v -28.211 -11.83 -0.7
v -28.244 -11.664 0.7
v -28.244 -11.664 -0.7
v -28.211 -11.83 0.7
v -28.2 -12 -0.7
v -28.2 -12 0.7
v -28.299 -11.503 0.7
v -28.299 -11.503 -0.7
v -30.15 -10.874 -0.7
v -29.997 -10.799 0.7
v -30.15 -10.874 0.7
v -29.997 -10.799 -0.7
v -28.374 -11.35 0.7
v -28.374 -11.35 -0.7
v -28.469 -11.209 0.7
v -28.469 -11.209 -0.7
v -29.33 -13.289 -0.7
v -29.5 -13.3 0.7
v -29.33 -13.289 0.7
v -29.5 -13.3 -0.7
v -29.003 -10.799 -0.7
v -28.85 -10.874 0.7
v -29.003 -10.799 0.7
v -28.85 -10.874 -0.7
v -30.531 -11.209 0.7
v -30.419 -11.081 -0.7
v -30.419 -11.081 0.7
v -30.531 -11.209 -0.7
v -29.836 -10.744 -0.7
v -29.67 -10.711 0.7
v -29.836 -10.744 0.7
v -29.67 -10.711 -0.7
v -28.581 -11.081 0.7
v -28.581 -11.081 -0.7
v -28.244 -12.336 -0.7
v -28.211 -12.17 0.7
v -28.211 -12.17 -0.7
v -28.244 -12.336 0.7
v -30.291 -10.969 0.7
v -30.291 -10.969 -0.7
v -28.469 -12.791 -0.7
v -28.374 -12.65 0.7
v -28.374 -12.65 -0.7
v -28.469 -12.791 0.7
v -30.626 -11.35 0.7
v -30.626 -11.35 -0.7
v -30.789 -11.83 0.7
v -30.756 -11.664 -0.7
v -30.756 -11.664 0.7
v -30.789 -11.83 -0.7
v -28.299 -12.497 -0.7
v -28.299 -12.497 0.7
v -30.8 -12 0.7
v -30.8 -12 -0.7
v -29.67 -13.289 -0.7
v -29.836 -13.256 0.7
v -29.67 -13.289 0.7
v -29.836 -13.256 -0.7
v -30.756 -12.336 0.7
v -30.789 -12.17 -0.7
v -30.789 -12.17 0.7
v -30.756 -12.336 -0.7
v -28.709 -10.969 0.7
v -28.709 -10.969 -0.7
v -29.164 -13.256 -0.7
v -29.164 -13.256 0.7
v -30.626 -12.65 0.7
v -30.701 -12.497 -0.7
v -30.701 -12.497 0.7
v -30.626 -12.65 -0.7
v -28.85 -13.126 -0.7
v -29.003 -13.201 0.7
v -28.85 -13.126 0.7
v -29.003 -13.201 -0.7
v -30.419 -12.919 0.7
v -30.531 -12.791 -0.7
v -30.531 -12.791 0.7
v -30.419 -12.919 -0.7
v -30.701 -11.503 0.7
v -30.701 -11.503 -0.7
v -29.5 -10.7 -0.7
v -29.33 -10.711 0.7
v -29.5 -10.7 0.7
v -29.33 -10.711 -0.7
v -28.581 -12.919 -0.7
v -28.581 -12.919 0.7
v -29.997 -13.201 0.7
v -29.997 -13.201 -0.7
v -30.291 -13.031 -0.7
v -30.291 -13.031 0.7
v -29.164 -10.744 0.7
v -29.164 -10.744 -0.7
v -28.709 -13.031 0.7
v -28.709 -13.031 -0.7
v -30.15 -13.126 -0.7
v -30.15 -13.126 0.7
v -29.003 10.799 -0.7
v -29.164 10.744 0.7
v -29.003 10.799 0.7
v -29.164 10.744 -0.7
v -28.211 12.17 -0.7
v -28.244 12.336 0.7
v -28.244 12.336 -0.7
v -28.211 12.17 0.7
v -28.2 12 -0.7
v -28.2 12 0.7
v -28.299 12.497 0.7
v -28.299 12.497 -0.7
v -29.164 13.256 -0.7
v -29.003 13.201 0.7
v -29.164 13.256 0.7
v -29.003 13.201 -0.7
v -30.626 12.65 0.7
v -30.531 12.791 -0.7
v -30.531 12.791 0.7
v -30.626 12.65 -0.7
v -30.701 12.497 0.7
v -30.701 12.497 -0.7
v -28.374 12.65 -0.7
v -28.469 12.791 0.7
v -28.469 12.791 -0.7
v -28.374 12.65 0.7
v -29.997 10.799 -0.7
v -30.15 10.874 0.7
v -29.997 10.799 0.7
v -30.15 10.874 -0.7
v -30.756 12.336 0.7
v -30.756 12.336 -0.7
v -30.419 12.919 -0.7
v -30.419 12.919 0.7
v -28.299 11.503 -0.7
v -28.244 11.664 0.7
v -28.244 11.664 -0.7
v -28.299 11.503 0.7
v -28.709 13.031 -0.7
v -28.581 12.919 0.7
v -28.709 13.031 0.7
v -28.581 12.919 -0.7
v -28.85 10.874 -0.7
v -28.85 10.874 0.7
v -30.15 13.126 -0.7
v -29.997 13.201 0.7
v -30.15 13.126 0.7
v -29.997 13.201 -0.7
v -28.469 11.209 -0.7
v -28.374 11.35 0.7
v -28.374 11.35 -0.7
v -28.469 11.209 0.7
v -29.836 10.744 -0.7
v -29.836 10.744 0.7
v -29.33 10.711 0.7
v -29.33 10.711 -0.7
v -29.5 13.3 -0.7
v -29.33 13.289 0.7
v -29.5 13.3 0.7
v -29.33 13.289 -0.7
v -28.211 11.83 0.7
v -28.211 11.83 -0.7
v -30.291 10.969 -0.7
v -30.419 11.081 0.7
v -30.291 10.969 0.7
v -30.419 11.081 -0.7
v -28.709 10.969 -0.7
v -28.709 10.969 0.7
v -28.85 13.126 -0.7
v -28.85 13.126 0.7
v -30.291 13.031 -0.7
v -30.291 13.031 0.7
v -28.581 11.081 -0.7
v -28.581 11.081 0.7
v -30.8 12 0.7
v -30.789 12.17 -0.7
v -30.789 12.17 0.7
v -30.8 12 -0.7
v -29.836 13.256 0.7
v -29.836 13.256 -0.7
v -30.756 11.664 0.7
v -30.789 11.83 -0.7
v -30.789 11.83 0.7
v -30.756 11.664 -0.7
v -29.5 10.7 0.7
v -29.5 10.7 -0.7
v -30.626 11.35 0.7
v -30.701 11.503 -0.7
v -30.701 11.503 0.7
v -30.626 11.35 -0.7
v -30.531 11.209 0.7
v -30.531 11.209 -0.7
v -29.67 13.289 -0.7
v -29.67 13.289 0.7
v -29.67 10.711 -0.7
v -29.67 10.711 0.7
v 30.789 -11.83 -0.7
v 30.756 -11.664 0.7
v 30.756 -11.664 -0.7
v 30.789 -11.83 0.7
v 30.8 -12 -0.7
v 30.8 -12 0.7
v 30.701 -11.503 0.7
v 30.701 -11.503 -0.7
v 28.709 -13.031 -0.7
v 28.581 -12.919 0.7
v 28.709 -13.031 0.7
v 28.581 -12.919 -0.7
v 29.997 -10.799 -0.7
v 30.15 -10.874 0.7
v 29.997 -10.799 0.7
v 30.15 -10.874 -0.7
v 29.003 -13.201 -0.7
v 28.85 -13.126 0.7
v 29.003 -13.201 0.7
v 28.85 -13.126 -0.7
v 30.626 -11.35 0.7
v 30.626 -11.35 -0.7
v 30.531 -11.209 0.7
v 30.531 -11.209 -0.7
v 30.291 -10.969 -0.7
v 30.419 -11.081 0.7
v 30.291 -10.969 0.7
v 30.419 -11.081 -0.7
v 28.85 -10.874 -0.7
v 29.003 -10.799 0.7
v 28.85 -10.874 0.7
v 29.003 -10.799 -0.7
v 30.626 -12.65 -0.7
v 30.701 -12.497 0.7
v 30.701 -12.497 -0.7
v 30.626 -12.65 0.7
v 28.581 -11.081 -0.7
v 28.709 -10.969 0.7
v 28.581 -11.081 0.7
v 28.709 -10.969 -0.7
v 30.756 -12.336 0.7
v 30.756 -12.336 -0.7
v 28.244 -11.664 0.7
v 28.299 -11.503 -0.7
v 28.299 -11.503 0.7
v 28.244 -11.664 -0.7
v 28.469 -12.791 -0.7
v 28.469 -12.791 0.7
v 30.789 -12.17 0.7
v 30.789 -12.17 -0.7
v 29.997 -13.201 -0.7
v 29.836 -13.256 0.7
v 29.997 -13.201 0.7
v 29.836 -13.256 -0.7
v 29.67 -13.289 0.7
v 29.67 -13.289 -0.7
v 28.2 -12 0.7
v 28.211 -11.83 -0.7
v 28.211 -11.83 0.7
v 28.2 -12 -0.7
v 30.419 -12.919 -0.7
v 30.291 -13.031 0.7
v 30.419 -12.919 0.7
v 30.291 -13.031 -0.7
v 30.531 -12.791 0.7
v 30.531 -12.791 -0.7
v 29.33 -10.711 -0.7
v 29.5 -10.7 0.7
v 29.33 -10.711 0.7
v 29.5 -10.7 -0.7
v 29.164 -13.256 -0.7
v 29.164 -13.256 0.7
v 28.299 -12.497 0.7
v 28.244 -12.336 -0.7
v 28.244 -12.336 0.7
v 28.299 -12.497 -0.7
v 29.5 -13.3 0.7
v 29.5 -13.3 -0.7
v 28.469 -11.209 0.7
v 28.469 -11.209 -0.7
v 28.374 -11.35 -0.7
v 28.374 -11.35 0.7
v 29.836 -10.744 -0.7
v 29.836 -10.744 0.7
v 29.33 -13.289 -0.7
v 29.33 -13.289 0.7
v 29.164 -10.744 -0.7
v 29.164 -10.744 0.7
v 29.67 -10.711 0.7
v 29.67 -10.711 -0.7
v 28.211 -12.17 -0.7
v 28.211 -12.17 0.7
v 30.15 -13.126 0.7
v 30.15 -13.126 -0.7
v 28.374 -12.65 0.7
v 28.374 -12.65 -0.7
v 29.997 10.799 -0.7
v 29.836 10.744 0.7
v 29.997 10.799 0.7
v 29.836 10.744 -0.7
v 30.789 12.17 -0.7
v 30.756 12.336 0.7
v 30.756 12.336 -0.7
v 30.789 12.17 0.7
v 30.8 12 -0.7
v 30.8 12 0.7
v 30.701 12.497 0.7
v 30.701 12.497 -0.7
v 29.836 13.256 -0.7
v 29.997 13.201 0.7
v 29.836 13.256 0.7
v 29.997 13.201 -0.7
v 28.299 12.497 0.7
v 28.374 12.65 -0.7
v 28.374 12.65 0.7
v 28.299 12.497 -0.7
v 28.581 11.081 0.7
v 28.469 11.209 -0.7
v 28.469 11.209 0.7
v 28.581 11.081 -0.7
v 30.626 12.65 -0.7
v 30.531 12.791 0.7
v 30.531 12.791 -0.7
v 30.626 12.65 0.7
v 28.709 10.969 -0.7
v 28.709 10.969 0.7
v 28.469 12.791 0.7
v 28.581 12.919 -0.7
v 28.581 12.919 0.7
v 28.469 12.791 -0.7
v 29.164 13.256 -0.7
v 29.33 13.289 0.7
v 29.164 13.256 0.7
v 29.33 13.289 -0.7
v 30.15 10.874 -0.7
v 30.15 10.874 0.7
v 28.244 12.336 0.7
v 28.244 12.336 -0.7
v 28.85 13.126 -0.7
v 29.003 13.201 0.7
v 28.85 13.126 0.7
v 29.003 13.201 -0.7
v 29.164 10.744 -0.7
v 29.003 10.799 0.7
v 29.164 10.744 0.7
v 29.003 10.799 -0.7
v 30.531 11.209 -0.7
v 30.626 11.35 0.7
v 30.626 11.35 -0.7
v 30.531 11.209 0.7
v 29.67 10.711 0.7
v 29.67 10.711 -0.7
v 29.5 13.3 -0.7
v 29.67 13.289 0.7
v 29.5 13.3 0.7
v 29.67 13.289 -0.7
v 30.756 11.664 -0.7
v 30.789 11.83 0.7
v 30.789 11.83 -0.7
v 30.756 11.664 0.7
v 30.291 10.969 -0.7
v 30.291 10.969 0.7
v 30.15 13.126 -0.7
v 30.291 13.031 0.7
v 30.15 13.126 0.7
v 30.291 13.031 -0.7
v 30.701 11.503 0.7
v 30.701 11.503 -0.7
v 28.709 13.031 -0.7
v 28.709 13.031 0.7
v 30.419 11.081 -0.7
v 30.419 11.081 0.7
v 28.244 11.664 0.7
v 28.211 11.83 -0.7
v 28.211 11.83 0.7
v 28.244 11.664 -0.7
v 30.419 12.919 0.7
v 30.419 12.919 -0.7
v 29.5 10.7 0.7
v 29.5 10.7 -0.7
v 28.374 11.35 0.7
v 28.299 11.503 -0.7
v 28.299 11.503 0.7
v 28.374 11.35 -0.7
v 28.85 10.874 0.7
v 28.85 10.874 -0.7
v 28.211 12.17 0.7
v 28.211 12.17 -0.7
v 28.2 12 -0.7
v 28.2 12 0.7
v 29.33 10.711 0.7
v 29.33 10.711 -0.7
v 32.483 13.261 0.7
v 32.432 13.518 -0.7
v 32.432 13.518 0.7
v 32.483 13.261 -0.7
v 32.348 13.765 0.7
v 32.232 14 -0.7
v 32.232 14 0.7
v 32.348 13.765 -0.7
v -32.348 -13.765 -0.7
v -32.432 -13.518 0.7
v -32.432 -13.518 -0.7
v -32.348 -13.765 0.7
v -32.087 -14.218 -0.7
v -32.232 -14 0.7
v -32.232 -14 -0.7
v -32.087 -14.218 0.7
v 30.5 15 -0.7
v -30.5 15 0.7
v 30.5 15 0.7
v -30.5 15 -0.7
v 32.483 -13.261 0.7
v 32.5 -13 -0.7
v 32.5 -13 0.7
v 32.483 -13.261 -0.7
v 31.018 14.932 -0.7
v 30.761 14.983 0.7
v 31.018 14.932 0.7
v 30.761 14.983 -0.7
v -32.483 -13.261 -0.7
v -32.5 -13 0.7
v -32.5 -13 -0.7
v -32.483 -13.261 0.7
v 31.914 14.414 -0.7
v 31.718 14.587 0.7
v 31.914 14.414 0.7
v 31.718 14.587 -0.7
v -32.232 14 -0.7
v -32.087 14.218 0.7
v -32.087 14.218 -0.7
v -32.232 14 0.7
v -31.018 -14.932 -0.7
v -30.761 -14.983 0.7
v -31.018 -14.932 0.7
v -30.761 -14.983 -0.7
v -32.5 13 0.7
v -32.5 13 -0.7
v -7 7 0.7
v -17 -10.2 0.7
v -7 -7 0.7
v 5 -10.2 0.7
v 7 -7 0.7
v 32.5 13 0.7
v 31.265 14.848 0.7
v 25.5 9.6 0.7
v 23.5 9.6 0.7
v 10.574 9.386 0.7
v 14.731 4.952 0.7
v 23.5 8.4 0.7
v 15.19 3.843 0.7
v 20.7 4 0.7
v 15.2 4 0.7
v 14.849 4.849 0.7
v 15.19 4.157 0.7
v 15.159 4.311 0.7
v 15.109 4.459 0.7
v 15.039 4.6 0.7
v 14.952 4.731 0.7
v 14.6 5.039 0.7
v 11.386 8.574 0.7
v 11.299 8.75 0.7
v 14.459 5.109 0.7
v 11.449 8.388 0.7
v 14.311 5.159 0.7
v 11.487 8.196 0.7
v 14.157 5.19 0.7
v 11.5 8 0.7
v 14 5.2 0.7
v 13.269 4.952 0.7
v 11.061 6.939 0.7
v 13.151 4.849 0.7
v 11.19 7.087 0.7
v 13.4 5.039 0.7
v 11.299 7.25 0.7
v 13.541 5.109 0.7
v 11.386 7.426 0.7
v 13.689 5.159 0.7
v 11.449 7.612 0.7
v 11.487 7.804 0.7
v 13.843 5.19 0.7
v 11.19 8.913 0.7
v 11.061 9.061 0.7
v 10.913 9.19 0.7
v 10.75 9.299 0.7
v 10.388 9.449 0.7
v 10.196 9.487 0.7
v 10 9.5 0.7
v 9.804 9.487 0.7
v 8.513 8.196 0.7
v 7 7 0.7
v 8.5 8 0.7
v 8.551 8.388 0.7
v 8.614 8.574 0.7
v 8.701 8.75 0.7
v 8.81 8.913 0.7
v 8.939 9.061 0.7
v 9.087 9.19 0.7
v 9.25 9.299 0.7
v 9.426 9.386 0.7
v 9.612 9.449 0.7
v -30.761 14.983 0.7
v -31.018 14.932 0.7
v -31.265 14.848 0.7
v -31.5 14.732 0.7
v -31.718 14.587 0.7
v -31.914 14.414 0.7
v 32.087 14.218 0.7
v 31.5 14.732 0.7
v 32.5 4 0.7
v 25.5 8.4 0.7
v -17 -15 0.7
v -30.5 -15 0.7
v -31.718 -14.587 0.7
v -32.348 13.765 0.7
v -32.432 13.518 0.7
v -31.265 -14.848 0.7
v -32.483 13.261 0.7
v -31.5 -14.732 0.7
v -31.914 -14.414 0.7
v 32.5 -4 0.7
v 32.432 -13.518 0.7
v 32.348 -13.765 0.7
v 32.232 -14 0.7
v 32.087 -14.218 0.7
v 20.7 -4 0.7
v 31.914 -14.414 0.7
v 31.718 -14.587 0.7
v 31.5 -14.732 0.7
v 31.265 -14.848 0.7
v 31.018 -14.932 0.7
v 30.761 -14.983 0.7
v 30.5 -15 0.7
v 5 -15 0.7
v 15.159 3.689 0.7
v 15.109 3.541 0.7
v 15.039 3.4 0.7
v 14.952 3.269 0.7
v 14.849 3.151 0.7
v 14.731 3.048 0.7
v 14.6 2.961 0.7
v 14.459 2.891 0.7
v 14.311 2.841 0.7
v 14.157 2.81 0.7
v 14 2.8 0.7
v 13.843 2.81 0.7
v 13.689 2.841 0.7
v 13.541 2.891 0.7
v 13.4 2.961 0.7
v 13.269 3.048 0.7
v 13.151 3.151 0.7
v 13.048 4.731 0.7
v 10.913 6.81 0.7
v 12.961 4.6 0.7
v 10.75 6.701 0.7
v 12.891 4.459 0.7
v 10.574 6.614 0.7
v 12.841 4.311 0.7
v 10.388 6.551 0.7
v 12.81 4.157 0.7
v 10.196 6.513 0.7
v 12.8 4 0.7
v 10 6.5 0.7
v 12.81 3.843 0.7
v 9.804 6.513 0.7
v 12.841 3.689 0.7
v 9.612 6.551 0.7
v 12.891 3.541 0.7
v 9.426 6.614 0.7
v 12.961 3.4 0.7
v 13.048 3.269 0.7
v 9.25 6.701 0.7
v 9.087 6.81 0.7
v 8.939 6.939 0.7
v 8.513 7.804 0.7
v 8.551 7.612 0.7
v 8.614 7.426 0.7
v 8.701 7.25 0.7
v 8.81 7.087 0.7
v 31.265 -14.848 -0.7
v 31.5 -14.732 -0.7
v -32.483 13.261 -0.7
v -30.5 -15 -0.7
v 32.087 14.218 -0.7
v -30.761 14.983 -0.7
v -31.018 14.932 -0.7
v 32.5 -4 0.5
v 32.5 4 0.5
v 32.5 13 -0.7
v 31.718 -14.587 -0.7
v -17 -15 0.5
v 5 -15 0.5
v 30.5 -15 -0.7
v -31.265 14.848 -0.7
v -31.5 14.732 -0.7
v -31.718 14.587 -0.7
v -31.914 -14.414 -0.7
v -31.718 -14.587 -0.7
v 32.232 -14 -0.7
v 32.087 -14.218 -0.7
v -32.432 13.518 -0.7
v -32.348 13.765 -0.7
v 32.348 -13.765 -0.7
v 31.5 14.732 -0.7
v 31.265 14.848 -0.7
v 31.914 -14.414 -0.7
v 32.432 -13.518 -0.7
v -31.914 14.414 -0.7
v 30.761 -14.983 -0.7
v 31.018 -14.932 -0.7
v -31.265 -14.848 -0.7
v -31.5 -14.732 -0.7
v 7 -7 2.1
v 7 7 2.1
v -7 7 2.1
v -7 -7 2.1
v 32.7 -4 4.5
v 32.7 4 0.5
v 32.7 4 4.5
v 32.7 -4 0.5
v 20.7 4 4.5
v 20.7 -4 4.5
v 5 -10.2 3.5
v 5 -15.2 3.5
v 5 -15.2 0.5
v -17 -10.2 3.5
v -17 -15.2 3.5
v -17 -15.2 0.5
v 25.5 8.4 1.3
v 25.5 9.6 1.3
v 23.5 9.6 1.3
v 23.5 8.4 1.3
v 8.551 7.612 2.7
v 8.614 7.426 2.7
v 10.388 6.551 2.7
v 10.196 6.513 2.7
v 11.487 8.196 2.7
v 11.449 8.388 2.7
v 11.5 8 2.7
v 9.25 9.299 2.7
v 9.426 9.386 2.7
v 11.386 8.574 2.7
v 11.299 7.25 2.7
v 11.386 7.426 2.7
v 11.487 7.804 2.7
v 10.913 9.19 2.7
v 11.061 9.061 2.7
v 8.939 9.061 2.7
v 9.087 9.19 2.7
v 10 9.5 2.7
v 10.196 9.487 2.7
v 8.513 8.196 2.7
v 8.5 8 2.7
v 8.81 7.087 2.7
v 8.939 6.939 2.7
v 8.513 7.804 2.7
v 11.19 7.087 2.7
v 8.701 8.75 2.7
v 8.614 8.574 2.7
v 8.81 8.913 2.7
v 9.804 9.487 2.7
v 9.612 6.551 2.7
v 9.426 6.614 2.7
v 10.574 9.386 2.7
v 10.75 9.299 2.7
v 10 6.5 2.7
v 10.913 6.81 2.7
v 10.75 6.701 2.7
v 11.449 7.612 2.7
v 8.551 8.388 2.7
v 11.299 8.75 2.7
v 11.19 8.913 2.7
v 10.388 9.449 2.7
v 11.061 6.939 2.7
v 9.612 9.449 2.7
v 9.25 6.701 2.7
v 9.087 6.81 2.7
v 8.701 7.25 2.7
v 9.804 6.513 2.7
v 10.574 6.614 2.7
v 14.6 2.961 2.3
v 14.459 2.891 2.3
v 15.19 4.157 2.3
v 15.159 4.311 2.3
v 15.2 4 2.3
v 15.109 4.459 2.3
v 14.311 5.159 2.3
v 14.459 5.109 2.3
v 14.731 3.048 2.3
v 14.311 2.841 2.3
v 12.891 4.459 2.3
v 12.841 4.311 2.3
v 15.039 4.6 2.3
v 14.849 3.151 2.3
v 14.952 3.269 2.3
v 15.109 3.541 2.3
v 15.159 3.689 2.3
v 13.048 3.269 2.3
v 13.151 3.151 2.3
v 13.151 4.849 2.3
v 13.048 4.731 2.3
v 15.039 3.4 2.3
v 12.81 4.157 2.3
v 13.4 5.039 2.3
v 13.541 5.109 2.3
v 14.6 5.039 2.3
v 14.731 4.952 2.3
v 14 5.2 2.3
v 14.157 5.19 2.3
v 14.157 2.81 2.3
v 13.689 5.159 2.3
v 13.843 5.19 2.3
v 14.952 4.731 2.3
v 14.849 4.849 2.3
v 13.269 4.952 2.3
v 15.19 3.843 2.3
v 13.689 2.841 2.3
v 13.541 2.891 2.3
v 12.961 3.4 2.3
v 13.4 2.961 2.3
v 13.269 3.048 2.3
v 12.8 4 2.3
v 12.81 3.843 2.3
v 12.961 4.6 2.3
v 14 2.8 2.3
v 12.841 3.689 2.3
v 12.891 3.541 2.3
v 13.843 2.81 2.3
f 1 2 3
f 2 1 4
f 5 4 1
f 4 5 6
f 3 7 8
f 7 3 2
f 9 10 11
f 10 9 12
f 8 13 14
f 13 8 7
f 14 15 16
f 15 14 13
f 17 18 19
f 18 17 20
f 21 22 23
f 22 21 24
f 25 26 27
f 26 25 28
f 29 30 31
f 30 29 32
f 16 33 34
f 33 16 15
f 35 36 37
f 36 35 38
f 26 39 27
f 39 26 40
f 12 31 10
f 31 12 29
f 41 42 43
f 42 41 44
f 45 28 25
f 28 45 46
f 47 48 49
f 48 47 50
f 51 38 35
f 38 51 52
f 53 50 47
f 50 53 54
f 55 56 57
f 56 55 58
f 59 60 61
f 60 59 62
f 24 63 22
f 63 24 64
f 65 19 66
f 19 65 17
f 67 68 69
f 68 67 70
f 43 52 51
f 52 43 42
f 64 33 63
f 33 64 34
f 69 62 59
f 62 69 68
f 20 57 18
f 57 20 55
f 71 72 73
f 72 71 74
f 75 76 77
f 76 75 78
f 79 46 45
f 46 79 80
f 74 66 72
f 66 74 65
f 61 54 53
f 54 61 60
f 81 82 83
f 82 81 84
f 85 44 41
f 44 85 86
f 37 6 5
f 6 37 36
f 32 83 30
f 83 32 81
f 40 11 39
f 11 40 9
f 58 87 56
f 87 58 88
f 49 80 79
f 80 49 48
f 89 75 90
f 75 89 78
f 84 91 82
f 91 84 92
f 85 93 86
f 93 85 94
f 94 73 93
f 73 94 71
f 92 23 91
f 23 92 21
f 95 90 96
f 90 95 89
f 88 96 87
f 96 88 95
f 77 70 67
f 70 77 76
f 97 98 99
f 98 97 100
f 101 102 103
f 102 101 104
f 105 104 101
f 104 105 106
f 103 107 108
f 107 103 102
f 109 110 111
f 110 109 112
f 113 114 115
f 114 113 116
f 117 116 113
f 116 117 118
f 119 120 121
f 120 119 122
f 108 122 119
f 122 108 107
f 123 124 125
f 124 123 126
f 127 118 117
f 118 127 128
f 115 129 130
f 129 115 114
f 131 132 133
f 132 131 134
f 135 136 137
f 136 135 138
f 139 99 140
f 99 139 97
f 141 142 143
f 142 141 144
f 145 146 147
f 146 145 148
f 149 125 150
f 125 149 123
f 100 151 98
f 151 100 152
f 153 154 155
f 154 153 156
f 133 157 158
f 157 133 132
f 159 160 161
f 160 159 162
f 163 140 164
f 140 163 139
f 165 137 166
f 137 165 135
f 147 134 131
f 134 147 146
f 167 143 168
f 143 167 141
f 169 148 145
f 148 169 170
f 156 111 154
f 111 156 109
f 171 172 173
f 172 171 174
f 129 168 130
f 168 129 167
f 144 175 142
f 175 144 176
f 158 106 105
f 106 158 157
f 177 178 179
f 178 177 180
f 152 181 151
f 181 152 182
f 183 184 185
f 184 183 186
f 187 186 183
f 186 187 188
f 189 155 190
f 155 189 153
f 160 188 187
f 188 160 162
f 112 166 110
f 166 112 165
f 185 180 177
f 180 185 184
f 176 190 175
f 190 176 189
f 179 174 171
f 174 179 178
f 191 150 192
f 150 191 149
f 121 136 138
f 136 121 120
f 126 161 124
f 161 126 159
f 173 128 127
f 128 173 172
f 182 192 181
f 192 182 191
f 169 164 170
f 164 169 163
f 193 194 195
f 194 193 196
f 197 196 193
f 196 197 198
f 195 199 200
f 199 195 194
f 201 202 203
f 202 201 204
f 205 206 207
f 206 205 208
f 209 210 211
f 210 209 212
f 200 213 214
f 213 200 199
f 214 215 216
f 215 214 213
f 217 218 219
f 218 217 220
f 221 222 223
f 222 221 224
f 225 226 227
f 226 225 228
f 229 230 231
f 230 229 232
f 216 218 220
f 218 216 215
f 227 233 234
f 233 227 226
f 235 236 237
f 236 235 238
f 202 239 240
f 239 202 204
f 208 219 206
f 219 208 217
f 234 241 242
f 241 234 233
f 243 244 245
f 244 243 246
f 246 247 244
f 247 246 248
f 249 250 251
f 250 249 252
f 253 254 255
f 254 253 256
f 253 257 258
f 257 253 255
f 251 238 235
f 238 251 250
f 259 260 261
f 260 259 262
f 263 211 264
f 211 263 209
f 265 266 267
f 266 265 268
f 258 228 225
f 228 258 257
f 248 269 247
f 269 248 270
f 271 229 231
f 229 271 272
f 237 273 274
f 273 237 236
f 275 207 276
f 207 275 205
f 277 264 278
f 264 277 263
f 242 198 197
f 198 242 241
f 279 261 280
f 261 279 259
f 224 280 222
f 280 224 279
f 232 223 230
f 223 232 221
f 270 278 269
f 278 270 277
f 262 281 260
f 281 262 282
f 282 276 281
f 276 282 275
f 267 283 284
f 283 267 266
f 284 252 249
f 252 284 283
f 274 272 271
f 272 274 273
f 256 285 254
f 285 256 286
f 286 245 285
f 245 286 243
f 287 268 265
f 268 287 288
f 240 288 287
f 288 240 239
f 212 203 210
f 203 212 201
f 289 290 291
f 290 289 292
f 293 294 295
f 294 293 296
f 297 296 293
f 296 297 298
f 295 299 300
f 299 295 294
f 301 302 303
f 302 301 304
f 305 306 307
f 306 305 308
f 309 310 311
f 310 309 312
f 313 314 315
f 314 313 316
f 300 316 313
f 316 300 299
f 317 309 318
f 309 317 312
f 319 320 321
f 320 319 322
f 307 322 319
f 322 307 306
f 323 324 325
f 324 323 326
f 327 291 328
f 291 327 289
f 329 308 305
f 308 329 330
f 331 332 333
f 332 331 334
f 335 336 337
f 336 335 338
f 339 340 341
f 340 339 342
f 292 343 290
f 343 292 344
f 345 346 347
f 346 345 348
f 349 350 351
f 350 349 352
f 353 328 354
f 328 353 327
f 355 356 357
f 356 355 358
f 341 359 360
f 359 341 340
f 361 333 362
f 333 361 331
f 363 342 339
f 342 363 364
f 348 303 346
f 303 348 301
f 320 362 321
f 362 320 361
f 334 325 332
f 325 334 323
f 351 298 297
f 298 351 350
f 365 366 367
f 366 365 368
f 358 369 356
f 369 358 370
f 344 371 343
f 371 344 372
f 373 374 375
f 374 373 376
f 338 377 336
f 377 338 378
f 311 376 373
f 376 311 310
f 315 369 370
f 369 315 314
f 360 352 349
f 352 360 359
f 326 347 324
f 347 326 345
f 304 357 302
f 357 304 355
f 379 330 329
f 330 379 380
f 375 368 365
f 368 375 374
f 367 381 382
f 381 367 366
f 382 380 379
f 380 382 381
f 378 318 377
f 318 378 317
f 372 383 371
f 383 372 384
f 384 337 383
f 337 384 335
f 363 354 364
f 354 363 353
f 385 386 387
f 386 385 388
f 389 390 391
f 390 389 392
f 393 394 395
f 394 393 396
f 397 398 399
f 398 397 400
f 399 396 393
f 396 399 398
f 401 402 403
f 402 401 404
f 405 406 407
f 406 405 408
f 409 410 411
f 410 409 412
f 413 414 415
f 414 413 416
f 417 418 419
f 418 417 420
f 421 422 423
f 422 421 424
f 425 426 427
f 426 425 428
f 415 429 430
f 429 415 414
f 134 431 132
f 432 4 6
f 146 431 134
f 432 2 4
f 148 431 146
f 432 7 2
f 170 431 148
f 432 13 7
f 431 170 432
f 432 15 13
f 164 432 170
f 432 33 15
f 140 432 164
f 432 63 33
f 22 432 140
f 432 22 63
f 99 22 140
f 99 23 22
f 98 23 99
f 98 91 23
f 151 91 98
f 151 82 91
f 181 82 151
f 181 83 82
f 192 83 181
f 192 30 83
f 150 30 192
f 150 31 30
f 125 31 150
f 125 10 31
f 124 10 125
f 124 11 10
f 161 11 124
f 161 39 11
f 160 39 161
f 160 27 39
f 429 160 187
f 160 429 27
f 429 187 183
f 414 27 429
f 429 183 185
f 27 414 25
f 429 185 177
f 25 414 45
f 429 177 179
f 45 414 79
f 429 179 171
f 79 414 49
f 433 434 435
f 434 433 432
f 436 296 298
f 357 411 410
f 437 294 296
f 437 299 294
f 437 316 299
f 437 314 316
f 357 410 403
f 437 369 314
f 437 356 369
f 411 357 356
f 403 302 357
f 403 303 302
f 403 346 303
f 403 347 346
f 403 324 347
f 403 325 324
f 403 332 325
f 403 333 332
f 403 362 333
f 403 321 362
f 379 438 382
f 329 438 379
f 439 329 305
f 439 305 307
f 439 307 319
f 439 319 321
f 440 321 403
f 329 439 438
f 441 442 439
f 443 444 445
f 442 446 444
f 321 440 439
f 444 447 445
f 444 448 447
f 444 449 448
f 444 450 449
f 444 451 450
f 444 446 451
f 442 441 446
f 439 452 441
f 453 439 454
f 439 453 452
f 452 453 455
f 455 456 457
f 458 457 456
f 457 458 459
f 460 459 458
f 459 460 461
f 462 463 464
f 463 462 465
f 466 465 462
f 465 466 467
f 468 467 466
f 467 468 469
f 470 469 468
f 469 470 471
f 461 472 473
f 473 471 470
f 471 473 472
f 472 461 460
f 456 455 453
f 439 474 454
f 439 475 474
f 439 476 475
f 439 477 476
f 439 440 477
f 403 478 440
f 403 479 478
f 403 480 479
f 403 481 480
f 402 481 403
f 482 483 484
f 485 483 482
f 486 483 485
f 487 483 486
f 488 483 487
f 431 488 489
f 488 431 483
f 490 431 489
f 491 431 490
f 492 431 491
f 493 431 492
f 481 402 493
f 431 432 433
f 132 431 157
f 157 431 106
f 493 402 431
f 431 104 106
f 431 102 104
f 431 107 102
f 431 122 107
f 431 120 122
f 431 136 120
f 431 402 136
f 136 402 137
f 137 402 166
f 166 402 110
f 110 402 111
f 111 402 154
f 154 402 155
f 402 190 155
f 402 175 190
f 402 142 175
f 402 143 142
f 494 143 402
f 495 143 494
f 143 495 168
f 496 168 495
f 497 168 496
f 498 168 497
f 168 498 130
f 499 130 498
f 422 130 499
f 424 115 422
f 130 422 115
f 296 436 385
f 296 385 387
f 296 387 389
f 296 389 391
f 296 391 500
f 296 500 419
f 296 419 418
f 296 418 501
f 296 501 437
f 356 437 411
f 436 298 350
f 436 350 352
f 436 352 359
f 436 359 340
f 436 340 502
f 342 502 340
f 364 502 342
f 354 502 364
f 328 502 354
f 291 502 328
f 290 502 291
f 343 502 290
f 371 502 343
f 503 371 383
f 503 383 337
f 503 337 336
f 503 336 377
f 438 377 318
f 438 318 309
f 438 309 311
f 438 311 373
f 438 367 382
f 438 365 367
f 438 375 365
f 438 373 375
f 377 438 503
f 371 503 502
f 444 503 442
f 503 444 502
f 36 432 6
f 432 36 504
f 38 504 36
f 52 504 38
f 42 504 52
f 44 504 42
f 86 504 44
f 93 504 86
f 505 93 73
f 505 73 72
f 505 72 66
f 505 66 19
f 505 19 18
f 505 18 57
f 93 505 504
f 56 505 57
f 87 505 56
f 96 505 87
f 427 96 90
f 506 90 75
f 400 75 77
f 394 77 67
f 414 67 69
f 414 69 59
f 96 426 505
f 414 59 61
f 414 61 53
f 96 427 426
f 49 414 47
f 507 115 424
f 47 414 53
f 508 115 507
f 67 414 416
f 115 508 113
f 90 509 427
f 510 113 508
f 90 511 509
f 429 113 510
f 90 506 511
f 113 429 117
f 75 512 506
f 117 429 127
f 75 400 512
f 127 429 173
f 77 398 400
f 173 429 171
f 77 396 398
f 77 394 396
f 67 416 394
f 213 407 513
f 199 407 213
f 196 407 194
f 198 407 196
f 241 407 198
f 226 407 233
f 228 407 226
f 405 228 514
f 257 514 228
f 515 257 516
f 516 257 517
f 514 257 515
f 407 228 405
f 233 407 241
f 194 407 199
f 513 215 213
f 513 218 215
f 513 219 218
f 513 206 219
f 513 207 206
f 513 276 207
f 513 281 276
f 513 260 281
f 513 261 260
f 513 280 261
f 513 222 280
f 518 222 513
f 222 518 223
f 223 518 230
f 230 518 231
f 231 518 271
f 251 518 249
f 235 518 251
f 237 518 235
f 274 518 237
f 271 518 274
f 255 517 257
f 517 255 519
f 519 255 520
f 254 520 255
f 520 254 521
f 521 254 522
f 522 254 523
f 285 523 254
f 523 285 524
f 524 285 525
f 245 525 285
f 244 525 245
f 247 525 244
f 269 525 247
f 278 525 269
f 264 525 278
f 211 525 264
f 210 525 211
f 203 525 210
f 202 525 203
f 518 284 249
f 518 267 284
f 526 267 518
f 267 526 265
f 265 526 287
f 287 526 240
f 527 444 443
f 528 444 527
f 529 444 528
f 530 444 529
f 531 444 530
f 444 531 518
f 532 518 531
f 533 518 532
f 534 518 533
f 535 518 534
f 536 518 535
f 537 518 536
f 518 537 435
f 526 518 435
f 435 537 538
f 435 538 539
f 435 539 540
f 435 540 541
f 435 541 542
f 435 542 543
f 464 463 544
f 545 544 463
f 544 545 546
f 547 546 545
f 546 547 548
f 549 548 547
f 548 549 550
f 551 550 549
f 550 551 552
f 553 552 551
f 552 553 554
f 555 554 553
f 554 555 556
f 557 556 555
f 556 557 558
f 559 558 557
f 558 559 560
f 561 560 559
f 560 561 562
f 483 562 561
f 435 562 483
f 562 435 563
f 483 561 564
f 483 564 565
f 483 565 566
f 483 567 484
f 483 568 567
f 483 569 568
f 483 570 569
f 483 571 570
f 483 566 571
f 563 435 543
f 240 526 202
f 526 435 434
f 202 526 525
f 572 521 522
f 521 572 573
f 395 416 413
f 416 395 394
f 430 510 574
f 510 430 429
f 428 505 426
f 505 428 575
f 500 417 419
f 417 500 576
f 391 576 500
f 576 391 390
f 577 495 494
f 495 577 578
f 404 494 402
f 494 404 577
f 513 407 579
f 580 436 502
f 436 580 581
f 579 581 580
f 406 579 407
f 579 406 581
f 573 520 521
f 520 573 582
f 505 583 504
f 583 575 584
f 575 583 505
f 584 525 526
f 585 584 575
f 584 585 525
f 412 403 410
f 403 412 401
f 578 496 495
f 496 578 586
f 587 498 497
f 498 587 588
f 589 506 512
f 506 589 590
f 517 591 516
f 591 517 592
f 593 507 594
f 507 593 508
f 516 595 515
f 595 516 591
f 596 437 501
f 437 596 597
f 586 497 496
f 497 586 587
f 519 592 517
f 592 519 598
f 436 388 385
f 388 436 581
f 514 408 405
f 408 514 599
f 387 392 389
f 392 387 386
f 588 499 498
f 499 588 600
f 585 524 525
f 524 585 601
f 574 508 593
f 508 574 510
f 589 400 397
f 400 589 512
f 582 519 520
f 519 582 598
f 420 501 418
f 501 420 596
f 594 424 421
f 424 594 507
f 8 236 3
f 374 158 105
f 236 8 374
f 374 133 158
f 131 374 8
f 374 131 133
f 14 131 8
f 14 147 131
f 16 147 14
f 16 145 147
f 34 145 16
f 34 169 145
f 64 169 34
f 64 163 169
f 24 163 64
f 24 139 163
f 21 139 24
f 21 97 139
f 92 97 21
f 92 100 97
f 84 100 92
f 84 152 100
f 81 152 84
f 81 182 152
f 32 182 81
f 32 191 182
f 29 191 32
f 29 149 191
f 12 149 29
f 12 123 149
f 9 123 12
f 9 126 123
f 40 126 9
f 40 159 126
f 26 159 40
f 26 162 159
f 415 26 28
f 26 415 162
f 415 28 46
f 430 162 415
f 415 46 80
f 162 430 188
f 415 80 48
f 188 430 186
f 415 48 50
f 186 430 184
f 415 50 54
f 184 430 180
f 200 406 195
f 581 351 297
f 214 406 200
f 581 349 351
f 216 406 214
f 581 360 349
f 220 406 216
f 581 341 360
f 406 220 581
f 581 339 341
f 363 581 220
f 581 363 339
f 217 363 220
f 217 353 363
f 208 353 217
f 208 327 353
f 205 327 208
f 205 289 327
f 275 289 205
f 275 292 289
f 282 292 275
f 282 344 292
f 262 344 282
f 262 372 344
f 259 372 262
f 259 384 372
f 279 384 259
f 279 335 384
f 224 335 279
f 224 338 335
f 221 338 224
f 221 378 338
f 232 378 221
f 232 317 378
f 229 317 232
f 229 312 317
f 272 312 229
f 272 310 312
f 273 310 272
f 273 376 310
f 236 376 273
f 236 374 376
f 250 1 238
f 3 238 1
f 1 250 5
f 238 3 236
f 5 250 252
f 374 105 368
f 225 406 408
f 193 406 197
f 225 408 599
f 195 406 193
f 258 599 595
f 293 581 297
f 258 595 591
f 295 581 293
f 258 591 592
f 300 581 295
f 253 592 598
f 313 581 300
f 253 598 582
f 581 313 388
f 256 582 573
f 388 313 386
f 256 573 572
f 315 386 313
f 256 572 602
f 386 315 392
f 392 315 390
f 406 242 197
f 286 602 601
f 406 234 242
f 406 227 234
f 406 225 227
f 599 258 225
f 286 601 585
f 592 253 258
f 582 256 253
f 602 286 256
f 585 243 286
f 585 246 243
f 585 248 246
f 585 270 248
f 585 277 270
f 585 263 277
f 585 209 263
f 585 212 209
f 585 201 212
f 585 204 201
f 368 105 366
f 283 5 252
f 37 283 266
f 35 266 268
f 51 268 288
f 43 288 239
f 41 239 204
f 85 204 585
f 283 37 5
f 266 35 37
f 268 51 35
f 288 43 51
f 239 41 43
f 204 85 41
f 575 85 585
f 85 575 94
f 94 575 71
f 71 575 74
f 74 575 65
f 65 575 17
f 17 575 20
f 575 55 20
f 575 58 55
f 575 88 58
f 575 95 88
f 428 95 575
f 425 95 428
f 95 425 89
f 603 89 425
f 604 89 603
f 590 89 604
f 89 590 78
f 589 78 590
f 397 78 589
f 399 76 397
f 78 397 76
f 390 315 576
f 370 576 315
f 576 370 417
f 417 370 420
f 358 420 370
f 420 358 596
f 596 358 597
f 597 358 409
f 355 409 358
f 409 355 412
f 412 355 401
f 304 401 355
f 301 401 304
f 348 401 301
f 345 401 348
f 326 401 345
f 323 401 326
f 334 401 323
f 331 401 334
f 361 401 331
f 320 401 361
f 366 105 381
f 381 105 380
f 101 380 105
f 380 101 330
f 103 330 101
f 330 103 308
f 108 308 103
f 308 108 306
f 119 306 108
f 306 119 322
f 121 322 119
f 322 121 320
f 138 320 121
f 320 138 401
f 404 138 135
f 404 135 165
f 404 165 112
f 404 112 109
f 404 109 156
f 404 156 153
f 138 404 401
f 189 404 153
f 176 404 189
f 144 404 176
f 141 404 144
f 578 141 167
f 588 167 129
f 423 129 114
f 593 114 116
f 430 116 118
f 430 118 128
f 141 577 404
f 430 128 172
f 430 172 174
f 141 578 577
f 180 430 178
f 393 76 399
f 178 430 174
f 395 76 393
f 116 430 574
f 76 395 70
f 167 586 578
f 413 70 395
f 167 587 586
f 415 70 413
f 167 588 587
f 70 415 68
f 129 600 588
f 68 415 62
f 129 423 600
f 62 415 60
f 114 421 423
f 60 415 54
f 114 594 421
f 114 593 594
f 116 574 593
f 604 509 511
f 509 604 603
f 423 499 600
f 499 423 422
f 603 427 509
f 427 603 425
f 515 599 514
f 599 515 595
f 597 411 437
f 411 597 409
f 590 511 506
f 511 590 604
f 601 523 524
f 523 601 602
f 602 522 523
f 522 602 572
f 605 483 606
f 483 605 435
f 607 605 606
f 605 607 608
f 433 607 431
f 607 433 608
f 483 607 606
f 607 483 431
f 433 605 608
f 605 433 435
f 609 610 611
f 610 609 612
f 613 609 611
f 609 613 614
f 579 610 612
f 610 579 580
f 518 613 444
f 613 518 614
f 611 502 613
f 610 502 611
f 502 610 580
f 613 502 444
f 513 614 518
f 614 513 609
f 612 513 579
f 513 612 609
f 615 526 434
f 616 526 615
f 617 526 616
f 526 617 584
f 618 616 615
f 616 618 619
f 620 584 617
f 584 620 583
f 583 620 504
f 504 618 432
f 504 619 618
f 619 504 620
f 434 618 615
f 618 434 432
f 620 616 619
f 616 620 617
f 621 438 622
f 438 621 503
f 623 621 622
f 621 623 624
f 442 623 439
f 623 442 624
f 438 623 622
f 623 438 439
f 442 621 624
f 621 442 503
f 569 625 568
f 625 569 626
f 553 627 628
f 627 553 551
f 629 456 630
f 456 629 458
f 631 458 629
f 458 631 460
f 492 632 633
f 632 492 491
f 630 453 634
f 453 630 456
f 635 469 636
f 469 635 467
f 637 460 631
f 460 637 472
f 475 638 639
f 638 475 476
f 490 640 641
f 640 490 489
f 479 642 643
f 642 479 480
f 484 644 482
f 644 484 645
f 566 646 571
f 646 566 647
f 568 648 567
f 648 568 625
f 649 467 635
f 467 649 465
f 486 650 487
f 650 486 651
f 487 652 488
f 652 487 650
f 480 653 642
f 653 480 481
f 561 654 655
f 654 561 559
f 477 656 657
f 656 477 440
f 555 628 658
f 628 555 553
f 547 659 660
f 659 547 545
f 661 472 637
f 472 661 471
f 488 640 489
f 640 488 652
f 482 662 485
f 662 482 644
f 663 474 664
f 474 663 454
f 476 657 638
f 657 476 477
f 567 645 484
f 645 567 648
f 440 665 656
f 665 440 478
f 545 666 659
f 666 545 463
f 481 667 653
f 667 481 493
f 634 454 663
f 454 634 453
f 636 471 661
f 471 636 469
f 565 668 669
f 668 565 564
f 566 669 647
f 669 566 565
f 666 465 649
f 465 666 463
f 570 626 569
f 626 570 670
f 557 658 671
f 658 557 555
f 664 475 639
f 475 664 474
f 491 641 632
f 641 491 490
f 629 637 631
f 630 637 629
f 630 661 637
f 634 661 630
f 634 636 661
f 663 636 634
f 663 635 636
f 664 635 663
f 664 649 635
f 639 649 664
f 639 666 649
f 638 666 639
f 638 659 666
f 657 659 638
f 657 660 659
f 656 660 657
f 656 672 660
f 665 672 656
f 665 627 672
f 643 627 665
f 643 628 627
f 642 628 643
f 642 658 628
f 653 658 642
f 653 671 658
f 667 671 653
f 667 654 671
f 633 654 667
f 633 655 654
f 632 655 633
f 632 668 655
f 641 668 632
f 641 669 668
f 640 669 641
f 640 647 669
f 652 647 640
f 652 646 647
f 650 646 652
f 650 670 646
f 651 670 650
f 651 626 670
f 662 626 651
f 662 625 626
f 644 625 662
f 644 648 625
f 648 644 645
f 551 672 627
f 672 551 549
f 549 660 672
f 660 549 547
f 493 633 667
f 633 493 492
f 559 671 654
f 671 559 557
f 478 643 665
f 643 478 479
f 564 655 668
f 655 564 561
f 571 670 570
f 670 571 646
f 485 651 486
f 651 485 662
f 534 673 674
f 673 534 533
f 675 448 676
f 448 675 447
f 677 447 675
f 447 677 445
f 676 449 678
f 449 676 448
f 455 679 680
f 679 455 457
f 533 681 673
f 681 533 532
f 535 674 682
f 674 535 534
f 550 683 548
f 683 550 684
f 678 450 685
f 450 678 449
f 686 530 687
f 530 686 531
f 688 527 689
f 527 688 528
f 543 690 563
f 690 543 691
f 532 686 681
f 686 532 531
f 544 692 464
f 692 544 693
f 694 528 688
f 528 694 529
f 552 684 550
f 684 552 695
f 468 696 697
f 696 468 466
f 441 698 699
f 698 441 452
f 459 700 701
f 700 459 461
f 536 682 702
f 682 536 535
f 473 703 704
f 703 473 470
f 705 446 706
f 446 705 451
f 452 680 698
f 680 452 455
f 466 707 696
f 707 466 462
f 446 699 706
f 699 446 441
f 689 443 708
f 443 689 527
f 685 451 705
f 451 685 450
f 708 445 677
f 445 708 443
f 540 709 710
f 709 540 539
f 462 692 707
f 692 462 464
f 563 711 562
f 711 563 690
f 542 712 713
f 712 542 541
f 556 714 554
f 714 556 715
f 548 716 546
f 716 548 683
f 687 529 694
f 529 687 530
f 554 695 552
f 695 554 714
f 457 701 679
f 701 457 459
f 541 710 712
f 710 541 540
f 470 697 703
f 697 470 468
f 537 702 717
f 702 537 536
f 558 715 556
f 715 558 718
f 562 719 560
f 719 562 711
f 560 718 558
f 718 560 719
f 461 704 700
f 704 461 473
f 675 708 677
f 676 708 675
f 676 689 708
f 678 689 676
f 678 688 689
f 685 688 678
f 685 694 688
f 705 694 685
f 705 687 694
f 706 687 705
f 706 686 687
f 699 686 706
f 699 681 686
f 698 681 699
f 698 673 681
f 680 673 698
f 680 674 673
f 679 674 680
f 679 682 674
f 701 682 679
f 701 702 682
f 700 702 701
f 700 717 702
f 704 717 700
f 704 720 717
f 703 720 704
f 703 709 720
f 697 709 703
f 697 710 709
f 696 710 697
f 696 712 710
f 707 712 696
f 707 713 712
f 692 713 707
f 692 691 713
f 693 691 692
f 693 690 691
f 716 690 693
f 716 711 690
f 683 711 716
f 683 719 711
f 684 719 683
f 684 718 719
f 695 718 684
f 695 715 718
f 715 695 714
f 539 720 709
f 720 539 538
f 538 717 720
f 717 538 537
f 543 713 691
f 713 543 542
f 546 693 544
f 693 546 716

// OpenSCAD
$fn = 48;

// Parameters (requested PCB size)
pcb_length = 65.0;      // X
pcb_width  = 30.0;      // Y
pcb_thickness = 1.4;    // Z

// Small overlap to guarantee watertight unions
ov = 0.2;

// Feature parameters (generic SBC-like details)
corner_r = 2.0;

mount_hole_d = 2.6;
mount_hole_edge = 3.0; // distance from edges to hole center

// Components (all placed to TOUCH/OVERLAP the PCB so the model is ONE connected solid)
chip_xy = [14, 14];
chip_h  = 1.6;

usb_xy  = [12, 8];
usb_h   = 4.0;

header_xy = [22, 5];
header_h  = 3.0;

led_xy = [2.0, 1.2];
led_h  = 0.8;

module rounded_rect_2d(l, w, r) {
    // Robust rounded rectangle using hull of circles
    hull() {
        for (sx = [-1, 1], sy = [-1, 1])
            translate([sx*(l/2 - r), sy*(w/2 - r)]) circle(r=r);
    }
}

module pcb_with_holes() {
    difference() {
        // PCB body
        linear_extrude(height=pcb_thickness, center=true)
            rounded_rect_2d(pcb_length, pcb_width, corner_r);

        // 4 mounting holes (through)
        for (sx = [-1, 1], sy = [-1, 1]) {
            translate([
                sx*(pcb_length/2 - mount_hole_edge),
                sy*(pcb_width/2  - mount_hole_edge),
                0
            ])
            cylinder(h=pcb_thickness + 2, d=mount_hole_d, center=true);
        }
    }
}

module top_component(size_xy, h, pos_xy, col=[0.15,0.15,0.15]) {
    // Sits on top surface; overlaps slightly into PCB for connectivity
    color(col)
    translate([pos_xy[0], pos_xy[1], pcb_thickness/2 + h/2 - ov])
        cube([size_xy[0], size_xy[1], h], center=true);
}

module top_cylinder(d, h, pos_xy, col=[0.7,0.7,0.7]) {
    color(col)
    translate([pos_xy[0], pos_xy[1], pcb_thickness/2 + h/2 - ov])
        cylinder(h=h, d=d, center=true);
}

module sbc() {
    union() {
        // PCB
        color([0.0, 0.4, 0.2]) pcb_with_holes();

        // Main IC (center-ish)
        top_component(chip_xy, chip_h, [0, 0], [0.1, 0.1, 0.1]);

        // USB-like connector on +X edge (overlaps into PCB)
        // Place so its inner face is slightly inside the PCB edge
        usb_x = pcb_length/2 - usb_xy[0]/2 + ov;
        top_component(usb_xy, usb_h, [usb_x, 0], [0.75, 0.75, 0.75]);

        // Pin header along -Y edge
        header_y = -pcb_width/2 + header_xy[1]/2 - ov;
        top_component(header_xy, header_h, [-6, header_y], [0.05, 0.05, 0.05]);

        // Small LED near a corner
        top_component(led_xy, led_h,
                      [pcb_length/2 - 8, pcb_width/2 - 6],
                      [0.9, 0.1, 0.1]);

        // A couple of small capacitors (cylinders)
        top_cylinder(3.0, 2.2, [10, 8], [0.8, 0.8, 0.8]);
        top_cylinder(2.4, 1.8, [14, 4], [0.8, 0.8, 0.8]);
    }
}

// Final Output (ONE connected solid)
sbc();
